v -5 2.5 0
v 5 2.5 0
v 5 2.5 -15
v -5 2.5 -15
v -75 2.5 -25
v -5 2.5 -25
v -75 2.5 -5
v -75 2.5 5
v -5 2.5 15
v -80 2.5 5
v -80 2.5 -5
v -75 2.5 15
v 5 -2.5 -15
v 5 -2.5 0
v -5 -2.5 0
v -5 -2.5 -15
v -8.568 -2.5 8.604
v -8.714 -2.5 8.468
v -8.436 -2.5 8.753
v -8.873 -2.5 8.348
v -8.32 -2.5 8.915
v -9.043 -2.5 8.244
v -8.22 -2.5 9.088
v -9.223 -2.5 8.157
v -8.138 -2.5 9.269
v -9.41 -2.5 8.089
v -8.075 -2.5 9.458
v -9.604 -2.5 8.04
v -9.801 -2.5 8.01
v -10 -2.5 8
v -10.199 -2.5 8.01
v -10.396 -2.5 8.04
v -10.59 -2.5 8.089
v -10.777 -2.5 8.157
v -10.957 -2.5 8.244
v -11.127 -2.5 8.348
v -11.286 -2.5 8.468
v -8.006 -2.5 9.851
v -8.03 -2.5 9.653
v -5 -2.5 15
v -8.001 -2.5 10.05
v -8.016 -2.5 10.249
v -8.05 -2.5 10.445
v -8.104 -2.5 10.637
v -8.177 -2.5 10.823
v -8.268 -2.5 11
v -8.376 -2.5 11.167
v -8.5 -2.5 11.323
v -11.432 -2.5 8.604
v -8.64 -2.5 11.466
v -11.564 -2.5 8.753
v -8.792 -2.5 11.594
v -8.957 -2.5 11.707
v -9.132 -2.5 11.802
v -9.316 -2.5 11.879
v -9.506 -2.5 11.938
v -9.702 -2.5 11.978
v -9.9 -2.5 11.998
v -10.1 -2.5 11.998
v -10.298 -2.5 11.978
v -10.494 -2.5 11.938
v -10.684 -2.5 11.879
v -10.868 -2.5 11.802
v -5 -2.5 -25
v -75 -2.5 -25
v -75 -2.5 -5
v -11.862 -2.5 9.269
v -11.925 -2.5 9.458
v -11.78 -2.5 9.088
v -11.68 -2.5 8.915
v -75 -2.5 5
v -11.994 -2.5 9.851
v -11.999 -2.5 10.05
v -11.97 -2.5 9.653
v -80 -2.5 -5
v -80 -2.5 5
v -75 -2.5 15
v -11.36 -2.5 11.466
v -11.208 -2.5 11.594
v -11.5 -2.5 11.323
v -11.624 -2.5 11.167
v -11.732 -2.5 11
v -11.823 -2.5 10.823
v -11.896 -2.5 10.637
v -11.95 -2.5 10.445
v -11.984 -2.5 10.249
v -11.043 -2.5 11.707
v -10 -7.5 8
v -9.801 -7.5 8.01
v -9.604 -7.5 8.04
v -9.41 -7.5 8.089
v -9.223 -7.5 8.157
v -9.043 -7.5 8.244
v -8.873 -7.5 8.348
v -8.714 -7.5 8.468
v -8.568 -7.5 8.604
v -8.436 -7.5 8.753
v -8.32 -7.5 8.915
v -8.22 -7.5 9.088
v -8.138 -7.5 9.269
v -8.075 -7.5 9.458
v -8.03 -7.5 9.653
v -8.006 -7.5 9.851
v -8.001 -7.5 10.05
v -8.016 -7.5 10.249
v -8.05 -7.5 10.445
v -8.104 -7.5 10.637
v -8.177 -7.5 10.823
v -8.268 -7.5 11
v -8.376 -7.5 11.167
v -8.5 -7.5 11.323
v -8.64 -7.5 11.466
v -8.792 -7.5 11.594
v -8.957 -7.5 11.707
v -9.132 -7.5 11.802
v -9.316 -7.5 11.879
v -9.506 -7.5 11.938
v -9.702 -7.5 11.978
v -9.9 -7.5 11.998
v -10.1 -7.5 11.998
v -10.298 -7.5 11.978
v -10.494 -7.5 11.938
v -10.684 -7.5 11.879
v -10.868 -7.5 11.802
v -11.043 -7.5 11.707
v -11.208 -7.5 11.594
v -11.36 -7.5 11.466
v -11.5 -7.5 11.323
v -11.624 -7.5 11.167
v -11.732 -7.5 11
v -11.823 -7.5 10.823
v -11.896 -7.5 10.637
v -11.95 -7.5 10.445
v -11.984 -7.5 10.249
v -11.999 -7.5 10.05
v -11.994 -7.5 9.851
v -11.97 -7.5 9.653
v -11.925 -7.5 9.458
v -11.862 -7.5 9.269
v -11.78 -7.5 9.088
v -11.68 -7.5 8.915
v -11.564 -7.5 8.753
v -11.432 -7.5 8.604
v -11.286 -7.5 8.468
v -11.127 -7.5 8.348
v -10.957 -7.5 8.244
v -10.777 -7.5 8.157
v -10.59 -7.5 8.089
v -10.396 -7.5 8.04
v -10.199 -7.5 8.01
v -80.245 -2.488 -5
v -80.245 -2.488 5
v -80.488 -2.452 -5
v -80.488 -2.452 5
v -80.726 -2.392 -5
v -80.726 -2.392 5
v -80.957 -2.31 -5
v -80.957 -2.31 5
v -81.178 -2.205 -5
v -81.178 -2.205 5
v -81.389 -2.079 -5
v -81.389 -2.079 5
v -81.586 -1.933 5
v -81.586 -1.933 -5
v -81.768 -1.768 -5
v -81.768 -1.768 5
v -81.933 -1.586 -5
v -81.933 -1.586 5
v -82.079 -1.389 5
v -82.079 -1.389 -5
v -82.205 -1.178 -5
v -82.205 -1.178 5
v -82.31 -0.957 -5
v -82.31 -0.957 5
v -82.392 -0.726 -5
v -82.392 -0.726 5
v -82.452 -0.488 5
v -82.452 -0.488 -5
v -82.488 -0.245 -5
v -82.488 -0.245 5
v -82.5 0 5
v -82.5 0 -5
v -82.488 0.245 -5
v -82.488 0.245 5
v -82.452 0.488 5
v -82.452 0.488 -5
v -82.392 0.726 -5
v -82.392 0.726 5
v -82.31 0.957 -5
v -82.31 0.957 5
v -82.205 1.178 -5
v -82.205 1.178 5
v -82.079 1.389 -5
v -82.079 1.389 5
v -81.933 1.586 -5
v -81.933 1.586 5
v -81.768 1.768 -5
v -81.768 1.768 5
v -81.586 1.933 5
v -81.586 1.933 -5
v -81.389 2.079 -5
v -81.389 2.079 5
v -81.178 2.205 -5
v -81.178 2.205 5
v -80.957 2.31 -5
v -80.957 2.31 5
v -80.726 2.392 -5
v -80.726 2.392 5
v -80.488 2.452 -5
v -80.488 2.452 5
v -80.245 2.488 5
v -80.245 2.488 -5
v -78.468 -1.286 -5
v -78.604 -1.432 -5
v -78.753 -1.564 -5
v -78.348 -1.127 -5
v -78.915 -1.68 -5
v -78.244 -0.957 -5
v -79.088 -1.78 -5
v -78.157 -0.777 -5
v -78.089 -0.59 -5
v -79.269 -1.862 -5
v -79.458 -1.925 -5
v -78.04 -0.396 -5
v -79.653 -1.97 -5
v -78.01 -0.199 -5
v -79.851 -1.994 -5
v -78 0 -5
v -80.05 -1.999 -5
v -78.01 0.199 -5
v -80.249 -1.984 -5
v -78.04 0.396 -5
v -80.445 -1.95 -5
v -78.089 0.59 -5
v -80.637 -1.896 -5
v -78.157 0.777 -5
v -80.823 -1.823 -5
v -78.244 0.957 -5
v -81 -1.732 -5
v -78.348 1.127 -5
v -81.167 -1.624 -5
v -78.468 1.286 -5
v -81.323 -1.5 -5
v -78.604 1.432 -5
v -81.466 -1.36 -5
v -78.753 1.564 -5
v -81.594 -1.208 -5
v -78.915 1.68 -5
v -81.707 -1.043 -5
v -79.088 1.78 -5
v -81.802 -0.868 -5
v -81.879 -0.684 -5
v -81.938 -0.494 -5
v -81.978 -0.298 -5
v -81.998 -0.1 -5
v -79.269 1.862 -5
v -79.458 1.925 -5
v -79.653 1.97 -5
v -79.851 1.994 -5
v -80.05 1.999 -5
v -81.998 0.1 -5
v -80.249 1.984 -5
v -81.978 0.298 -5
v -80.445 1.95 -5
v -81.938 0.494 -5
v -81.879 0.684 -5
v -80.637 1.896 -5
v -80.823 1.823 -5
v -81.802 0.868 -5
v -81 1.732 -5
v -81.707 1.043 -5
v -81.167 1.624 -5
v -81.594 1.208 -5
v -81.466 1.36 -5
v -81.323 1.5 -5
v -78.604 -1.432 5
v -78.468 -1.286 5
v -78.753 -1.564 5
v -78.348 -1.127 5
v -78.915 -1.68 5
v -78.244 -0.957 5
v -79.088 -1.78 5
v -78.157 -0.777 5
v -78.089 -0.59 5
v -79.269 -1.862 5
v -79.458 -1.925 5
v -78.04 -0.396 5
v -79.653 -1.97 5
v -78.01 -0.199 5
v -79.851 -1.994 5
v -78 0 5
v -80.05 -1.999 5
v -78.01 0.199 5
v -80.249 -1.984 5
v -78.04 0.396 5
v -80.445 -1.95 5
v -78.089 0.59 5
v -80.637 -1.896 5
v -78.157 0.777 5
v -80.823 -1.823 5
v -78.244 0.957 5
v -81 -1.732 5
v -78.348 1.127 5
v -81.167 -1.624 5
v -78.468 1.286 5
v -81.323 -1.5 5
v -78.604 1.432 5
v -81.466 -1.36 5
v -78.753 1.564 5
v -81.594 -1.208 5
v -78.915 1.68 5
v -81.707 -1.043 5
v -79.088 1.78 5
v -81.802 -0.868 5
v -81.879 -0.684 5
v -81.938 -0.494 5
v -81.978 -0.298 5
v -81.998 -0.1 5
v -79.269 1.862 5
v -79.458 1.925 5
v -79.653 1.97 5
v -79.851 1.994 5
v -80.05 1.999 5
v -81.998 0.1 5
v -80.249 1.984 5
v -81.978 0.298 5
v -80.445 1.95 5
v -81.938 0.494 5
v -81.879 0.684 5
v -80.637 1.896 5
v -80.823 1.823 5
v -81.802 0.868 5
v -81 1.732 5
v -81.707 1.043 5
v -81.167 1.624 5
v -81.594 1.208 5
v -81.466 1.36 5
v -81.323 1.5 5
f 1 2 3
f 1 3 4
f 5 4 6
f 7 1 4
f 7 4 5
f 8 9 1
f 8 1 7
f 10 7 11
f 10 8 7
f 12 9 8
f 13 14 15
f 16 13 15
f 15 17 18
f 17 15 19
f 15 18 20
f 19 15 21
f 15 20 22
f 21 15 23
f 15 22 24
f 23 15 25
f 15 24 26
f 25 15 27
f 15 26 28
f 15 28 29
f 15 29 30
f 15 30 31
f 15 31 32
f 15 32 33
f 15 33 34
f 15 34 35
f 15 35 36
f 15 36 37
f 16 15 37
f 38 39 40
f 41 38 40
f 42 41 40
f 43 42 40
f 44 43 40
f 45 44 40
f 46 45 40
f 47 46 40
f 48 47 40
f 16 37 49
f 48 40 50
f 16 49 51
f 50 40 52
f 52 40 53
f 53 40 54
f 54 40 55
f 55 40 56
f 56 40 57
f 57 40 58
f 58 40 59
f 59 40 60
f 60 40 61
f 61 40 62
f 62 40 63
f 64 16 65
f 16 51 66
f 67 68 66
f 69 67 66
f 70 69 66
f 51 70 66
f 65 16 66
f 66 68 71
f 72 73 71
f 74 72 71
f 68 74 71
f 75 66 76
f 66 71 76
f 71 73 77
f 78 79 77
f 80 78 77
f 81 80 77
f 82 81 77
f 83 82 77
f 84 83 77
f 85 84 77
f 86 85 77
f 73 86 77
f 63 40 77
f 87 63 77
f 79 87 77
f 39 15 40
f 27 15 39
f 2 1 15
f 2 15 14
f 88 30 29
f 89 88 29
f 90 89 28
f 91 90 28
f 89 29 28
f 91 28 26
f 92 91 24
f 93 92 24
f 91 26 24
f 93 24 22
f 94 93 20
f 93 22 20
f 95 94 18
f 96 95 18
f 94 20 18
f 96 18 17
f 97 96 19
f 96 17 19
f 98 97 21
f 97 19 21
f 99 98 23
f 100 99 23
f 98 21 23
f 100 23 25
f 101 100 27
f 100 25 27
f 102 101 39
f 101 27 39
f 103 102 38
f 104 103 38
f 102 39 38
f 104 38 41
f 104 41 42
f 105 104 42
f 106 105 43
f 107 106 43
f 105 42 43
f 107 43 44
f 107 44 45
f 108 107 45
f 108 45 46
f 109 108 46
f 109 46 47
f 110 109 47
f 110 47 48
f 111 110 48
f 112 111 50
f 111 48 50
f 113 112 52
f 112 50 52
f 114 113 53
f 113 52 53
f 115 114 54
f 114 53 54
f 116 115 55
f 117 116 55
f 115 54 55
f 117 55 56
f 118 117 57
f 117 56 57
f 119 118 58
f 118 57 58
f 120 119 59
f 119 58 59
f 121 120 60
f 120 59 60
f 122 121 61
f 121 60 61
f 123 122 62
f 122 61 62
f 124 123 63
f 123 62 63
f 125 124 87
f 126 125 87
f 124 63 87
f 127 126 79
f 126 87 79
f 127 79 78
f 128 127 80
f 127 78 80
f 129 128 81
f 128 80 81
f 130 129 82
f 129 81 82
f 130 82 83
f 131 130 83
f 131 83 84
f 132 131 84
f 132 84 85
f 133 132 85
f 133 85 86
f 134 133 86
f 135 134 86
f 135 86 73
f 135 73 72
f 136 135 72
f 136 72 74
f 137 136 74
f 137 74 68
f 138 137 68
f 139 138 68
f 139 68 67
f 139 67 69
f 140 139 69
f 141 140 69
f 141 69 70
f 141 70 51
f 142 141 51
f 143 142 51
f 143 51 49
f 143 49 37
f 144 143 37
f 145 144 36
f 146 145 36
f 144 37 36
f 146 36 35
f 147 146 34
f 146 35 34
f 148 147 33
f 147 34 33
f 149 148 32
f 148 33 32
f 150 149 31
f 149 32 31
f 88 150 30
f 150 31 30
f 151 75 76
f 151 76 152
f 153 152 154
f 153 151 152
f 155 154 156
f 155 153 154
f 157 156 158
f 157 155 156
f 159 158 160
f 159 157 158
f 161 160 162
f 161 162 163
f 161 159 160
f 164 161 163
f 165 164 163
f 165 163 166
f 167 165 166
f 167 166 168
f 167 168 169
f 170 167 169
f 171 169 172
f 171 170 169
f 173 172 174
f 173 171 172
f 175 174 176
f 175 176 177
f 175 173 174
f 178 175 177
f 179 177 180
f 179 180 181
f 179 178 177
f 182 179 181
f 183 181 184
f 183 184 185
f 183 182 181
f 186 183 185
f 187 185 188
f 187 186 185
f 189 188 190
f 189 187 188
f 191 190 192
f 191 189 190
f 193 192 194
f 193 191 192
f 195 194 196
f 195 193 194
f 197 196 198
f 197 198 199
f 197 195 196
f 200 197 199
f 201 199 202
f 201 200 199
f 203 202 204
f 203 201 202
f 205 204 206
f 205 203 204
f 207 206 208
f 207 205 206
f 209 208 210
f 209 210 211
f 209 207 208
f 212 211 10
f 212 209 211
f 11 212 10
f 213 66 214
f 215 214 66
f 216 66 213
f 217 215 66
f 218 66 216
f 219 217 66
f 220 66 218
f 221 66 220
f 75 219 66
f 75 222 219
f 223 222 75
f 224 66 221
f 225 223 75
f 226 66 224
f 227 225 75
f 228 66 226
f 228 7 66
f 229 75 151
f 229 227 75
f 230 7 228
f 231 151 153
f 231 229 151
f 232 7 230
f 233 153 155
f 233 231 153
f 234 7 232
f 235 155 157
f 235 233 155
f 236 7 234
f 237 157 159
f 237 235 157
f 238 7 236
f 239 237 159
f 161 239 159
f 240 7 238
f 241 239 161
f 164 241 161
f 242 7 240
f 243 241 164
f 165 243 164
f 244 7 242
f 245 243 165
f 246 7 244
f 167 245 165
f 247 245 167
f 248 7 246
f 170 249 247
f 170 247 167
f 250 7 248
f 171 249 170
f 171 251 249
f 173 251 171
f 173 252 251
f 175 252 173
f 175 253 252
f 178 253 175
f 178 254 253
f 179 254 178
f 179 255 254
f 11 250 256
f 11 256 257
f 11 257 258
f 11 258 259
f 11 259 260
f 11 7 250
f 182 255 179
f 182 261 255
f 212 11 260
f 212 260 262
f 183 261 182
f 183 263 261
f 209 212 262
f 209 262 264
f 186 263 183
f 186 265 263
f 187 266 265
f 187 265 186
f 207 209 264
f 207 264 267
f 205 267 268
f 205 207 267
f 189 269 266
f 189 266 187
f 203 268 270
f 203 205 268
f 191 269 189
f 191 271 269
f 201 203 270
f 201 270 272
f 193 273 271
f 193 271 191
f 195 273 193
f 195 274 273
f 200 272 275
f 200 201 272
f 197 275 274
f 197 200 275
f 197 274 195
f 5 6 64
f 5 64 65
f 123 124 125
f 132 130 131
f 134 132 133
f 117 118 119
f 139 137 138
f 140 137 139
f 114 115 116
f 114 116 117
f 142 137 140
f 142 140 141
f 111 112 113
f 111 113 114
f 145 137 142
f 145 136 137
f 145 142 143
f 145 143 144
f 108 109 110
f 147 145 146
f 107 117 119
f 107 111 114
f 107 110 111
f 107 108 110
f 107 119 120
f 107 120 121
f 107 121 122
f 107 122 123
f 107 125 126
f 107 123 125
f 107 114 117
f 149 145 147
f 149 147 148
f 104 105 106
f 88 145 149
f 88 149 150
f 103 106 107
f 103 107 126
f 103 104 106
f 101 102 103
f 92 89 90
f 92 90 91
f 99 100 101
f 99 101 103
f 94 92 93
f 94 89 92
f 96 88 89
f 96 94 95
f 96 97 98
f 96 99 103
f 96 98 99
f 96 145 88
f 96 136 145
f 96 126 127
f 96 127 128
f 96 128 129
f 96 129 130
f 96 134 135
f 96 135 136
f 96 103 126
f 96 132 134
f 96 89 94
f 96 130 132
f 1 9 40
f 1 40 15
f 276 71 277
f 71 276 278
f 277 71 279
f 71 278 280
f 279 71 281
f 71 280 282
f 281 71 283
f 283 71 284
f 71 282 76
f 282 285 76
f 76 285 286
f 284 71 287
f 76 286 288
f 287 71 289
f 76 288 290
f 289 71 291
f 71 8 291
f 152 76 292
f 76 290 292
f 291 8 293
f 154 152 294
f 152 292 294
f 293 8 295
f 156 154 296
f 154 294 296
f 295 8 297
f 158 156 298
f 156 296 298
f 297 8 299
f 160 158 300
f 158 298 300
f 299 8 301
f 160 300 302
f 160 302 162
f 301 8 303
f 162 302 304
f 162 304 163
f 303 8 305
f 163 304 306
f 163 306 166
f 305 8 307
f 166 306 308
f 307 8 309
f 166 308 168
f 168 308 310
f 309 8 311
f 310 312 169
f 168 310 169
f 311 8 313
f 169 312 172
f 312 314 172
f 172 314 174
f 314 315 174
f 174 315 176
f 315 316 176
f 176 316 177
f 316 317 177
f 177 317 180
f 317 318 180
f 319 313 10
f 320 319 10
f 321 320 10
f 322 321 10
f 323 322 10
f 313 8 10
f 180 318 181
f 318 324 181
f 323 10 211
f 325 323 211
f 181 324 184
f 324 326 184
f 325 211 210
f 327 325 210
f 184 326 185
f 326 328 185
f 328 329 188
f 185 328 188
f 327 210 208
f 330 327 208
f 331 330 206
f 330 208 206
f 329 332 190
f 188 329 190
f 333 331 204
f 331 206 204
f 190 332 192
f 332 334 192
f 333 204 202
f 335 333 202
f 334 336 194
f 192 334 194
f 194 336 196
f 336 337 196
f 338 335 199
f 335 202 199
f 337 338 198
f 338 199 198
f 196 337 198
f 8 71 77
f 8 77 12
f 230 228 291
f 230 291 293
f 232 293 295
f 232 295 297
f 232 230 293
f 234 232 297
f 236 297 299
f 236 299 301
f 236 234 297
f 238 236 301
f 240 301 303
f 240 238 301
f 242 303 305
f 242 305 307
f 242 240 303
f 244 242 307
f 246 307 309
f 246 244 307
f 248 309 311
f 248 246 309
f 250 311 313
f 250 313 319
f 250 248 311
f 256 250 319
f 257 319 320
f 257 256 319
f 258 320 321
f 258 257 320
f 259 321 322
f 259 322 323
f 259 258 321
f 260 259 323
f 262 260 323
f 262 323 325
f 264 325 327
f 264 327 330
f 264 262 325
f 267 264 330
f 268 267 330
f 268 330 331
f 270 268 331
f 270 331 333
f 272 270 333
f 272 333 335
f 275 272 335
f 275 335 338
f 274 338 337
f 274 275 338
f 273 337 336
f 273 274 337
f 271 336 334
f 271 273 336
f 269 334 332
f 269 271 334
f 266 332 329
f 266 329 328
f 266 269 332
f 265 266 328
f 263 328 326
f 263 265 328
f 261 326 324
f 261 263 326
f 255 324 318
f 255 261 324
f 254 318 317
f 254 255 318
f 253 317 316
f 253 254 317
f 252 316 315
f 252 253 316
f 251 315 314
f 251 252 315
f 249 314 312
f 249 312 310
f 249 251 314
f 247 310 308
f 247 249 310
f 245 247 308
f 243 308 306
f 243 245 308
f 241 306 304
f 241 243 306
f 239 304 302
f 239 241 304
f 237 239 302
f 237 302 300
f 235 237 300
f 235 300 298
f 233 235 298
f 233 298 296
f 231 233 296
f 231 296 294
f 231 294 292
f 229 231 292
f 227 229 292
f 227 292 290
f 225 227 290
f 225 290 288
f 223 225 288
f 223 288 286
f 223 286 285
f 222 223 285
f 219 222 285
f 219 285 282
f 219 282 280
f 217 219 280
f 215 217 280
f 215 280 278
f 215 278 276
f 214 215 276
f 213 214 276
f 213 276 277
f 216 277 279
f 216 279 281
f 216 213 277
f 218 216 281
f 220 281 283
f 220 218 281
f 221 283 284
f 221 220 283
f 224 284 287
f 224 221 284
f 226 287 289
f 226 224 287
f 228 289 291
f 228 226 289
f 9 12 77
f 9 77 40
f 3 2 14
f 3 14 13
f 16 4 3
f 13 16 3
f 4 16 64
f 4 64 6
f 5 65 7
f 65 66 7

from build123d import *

# Parameters (mm, degrees)
BASE_DEPTH          = 5
BASE_DEPTH_BACK     = 5
ESQUISSE1_R         = 2
ESQUISSE2_W         = 75
ESQUISSE2_H         = 5
BOSS_GRAND_DEPTH    = 10
ESQUISSE3_W         = 75
ESQUISSE3_H         = 5
BOSS_PETIT_DEPTH    = 10
ESQUISSE4_W         = 5
ESQUISSE4_H         = 15
BOSS_BLOQUER_DEPTH  = 5
ESQUISSE5_W         = 5
ESQUISSE5_H         = 15
VIDE_BLOQUER_DEPTH  = 5
ESQUISSE6_W         = 70
ESQUISSE6_H         = 5
BOSS_BAS_DEPTH      = 10
ESQUISSE8_R         = 2
ATTACHE_CORDE_DEPTH = 5


with BuildPart() as part:
    # Esquisse1 → BASE (new, two sides: drawn at the far end of the back side and taken through both)
    with BuildSketch(Plane.XY.offset(-BASE_DEPTH_BACK)):
        with BuildLine():
            Line((-80, 2.5), (0, 2.5))
            Line((0, 2.5), (0, -2.5))
            Line((0, -2.5), (-80, -2.5))
            ThreePointArc((-80, -2.5), (-82.5, 0), (-80, 2.5))
        make_face()
        with Locations((-80, 0)):
            Circle(ESQUISSE1_R, mode=Mode.SUBTRACT)
    extrude(amount=BASE_DEPTH + BASE_DEPTH_BACK)

    # Esquisse2 → BOSS GRAND (add)
    with BuildSketch(Plane.XY.offset(5)):
        with Locations((-37.5, 0)):
            Rectangle(ESQUISSE2_W, ESQUISSE2_H)
    extrude(amount=BOSS_GRAND_DEPTH)

    # Esquisse3 → BOSS PETIT (add)
    with BuildSketch(Plane(origin=(0, 0, -5), x_dir=(-1, 0, 0), z_dir=(0, 0, -1))):
        with Locations((37.5, 0)):
            Rectangle(ESQUISSE3_W, ESQUISSE3_H)
    extrude(amount=BOSS_PETIT_DEPTH)

    # Esquisse4 → BOSS BLOQUER (add)
    with BuildSketch(Plane(origin=(0, 2.5, 0), x_dir=(1, 0, 0), z_dir=(0, 1, 0))):
        with Locations((2.5, 7.5)):
            Rectangle(ESQUISSE4_W, ESQUISSE4_H)
    extrude(amount=-BOSS_BLOQUER_DEPTH)

    # Esquisse5 → VIDE BLOQUER (cut)
    with BuildSketch(Plane(origin=(0, 2.5, 0), x_dir=(1, 0, 0), z_dir=(0, 1, 0))):
        with Locations((-2.5, -7.5)):
            Rectangle(ESQUISSE5_W, ESQUISSE5_H)
    extrude(amount=-VIDE_BLOQUER_DEPTH, mode=Mode.SUBTRACT)

    # Esquisse6 → BOSS BAS (add)
    with BuildSketch(Plane(origin=(0, 0, -15), x_dir=(-1, 0, 0), z_dir=(0, 0, -1))):
        with Locations((40, 0)):
            Rectangle(ESQUISSE6_W, ESQUISSE6_H)
    extrude(amount=BOSS_BAS_DEPTH)

    # Esquisse8 → ATTACHE CORDE (add)
    with BuildSketch(Plane.XZ.offset(2.5)):
        with Locations((-10, 10)):
            Circle(ESQUISSE8_R)
    extrude(amount=ATTACHE_CORDE_DEPTH)


solid = part.part
